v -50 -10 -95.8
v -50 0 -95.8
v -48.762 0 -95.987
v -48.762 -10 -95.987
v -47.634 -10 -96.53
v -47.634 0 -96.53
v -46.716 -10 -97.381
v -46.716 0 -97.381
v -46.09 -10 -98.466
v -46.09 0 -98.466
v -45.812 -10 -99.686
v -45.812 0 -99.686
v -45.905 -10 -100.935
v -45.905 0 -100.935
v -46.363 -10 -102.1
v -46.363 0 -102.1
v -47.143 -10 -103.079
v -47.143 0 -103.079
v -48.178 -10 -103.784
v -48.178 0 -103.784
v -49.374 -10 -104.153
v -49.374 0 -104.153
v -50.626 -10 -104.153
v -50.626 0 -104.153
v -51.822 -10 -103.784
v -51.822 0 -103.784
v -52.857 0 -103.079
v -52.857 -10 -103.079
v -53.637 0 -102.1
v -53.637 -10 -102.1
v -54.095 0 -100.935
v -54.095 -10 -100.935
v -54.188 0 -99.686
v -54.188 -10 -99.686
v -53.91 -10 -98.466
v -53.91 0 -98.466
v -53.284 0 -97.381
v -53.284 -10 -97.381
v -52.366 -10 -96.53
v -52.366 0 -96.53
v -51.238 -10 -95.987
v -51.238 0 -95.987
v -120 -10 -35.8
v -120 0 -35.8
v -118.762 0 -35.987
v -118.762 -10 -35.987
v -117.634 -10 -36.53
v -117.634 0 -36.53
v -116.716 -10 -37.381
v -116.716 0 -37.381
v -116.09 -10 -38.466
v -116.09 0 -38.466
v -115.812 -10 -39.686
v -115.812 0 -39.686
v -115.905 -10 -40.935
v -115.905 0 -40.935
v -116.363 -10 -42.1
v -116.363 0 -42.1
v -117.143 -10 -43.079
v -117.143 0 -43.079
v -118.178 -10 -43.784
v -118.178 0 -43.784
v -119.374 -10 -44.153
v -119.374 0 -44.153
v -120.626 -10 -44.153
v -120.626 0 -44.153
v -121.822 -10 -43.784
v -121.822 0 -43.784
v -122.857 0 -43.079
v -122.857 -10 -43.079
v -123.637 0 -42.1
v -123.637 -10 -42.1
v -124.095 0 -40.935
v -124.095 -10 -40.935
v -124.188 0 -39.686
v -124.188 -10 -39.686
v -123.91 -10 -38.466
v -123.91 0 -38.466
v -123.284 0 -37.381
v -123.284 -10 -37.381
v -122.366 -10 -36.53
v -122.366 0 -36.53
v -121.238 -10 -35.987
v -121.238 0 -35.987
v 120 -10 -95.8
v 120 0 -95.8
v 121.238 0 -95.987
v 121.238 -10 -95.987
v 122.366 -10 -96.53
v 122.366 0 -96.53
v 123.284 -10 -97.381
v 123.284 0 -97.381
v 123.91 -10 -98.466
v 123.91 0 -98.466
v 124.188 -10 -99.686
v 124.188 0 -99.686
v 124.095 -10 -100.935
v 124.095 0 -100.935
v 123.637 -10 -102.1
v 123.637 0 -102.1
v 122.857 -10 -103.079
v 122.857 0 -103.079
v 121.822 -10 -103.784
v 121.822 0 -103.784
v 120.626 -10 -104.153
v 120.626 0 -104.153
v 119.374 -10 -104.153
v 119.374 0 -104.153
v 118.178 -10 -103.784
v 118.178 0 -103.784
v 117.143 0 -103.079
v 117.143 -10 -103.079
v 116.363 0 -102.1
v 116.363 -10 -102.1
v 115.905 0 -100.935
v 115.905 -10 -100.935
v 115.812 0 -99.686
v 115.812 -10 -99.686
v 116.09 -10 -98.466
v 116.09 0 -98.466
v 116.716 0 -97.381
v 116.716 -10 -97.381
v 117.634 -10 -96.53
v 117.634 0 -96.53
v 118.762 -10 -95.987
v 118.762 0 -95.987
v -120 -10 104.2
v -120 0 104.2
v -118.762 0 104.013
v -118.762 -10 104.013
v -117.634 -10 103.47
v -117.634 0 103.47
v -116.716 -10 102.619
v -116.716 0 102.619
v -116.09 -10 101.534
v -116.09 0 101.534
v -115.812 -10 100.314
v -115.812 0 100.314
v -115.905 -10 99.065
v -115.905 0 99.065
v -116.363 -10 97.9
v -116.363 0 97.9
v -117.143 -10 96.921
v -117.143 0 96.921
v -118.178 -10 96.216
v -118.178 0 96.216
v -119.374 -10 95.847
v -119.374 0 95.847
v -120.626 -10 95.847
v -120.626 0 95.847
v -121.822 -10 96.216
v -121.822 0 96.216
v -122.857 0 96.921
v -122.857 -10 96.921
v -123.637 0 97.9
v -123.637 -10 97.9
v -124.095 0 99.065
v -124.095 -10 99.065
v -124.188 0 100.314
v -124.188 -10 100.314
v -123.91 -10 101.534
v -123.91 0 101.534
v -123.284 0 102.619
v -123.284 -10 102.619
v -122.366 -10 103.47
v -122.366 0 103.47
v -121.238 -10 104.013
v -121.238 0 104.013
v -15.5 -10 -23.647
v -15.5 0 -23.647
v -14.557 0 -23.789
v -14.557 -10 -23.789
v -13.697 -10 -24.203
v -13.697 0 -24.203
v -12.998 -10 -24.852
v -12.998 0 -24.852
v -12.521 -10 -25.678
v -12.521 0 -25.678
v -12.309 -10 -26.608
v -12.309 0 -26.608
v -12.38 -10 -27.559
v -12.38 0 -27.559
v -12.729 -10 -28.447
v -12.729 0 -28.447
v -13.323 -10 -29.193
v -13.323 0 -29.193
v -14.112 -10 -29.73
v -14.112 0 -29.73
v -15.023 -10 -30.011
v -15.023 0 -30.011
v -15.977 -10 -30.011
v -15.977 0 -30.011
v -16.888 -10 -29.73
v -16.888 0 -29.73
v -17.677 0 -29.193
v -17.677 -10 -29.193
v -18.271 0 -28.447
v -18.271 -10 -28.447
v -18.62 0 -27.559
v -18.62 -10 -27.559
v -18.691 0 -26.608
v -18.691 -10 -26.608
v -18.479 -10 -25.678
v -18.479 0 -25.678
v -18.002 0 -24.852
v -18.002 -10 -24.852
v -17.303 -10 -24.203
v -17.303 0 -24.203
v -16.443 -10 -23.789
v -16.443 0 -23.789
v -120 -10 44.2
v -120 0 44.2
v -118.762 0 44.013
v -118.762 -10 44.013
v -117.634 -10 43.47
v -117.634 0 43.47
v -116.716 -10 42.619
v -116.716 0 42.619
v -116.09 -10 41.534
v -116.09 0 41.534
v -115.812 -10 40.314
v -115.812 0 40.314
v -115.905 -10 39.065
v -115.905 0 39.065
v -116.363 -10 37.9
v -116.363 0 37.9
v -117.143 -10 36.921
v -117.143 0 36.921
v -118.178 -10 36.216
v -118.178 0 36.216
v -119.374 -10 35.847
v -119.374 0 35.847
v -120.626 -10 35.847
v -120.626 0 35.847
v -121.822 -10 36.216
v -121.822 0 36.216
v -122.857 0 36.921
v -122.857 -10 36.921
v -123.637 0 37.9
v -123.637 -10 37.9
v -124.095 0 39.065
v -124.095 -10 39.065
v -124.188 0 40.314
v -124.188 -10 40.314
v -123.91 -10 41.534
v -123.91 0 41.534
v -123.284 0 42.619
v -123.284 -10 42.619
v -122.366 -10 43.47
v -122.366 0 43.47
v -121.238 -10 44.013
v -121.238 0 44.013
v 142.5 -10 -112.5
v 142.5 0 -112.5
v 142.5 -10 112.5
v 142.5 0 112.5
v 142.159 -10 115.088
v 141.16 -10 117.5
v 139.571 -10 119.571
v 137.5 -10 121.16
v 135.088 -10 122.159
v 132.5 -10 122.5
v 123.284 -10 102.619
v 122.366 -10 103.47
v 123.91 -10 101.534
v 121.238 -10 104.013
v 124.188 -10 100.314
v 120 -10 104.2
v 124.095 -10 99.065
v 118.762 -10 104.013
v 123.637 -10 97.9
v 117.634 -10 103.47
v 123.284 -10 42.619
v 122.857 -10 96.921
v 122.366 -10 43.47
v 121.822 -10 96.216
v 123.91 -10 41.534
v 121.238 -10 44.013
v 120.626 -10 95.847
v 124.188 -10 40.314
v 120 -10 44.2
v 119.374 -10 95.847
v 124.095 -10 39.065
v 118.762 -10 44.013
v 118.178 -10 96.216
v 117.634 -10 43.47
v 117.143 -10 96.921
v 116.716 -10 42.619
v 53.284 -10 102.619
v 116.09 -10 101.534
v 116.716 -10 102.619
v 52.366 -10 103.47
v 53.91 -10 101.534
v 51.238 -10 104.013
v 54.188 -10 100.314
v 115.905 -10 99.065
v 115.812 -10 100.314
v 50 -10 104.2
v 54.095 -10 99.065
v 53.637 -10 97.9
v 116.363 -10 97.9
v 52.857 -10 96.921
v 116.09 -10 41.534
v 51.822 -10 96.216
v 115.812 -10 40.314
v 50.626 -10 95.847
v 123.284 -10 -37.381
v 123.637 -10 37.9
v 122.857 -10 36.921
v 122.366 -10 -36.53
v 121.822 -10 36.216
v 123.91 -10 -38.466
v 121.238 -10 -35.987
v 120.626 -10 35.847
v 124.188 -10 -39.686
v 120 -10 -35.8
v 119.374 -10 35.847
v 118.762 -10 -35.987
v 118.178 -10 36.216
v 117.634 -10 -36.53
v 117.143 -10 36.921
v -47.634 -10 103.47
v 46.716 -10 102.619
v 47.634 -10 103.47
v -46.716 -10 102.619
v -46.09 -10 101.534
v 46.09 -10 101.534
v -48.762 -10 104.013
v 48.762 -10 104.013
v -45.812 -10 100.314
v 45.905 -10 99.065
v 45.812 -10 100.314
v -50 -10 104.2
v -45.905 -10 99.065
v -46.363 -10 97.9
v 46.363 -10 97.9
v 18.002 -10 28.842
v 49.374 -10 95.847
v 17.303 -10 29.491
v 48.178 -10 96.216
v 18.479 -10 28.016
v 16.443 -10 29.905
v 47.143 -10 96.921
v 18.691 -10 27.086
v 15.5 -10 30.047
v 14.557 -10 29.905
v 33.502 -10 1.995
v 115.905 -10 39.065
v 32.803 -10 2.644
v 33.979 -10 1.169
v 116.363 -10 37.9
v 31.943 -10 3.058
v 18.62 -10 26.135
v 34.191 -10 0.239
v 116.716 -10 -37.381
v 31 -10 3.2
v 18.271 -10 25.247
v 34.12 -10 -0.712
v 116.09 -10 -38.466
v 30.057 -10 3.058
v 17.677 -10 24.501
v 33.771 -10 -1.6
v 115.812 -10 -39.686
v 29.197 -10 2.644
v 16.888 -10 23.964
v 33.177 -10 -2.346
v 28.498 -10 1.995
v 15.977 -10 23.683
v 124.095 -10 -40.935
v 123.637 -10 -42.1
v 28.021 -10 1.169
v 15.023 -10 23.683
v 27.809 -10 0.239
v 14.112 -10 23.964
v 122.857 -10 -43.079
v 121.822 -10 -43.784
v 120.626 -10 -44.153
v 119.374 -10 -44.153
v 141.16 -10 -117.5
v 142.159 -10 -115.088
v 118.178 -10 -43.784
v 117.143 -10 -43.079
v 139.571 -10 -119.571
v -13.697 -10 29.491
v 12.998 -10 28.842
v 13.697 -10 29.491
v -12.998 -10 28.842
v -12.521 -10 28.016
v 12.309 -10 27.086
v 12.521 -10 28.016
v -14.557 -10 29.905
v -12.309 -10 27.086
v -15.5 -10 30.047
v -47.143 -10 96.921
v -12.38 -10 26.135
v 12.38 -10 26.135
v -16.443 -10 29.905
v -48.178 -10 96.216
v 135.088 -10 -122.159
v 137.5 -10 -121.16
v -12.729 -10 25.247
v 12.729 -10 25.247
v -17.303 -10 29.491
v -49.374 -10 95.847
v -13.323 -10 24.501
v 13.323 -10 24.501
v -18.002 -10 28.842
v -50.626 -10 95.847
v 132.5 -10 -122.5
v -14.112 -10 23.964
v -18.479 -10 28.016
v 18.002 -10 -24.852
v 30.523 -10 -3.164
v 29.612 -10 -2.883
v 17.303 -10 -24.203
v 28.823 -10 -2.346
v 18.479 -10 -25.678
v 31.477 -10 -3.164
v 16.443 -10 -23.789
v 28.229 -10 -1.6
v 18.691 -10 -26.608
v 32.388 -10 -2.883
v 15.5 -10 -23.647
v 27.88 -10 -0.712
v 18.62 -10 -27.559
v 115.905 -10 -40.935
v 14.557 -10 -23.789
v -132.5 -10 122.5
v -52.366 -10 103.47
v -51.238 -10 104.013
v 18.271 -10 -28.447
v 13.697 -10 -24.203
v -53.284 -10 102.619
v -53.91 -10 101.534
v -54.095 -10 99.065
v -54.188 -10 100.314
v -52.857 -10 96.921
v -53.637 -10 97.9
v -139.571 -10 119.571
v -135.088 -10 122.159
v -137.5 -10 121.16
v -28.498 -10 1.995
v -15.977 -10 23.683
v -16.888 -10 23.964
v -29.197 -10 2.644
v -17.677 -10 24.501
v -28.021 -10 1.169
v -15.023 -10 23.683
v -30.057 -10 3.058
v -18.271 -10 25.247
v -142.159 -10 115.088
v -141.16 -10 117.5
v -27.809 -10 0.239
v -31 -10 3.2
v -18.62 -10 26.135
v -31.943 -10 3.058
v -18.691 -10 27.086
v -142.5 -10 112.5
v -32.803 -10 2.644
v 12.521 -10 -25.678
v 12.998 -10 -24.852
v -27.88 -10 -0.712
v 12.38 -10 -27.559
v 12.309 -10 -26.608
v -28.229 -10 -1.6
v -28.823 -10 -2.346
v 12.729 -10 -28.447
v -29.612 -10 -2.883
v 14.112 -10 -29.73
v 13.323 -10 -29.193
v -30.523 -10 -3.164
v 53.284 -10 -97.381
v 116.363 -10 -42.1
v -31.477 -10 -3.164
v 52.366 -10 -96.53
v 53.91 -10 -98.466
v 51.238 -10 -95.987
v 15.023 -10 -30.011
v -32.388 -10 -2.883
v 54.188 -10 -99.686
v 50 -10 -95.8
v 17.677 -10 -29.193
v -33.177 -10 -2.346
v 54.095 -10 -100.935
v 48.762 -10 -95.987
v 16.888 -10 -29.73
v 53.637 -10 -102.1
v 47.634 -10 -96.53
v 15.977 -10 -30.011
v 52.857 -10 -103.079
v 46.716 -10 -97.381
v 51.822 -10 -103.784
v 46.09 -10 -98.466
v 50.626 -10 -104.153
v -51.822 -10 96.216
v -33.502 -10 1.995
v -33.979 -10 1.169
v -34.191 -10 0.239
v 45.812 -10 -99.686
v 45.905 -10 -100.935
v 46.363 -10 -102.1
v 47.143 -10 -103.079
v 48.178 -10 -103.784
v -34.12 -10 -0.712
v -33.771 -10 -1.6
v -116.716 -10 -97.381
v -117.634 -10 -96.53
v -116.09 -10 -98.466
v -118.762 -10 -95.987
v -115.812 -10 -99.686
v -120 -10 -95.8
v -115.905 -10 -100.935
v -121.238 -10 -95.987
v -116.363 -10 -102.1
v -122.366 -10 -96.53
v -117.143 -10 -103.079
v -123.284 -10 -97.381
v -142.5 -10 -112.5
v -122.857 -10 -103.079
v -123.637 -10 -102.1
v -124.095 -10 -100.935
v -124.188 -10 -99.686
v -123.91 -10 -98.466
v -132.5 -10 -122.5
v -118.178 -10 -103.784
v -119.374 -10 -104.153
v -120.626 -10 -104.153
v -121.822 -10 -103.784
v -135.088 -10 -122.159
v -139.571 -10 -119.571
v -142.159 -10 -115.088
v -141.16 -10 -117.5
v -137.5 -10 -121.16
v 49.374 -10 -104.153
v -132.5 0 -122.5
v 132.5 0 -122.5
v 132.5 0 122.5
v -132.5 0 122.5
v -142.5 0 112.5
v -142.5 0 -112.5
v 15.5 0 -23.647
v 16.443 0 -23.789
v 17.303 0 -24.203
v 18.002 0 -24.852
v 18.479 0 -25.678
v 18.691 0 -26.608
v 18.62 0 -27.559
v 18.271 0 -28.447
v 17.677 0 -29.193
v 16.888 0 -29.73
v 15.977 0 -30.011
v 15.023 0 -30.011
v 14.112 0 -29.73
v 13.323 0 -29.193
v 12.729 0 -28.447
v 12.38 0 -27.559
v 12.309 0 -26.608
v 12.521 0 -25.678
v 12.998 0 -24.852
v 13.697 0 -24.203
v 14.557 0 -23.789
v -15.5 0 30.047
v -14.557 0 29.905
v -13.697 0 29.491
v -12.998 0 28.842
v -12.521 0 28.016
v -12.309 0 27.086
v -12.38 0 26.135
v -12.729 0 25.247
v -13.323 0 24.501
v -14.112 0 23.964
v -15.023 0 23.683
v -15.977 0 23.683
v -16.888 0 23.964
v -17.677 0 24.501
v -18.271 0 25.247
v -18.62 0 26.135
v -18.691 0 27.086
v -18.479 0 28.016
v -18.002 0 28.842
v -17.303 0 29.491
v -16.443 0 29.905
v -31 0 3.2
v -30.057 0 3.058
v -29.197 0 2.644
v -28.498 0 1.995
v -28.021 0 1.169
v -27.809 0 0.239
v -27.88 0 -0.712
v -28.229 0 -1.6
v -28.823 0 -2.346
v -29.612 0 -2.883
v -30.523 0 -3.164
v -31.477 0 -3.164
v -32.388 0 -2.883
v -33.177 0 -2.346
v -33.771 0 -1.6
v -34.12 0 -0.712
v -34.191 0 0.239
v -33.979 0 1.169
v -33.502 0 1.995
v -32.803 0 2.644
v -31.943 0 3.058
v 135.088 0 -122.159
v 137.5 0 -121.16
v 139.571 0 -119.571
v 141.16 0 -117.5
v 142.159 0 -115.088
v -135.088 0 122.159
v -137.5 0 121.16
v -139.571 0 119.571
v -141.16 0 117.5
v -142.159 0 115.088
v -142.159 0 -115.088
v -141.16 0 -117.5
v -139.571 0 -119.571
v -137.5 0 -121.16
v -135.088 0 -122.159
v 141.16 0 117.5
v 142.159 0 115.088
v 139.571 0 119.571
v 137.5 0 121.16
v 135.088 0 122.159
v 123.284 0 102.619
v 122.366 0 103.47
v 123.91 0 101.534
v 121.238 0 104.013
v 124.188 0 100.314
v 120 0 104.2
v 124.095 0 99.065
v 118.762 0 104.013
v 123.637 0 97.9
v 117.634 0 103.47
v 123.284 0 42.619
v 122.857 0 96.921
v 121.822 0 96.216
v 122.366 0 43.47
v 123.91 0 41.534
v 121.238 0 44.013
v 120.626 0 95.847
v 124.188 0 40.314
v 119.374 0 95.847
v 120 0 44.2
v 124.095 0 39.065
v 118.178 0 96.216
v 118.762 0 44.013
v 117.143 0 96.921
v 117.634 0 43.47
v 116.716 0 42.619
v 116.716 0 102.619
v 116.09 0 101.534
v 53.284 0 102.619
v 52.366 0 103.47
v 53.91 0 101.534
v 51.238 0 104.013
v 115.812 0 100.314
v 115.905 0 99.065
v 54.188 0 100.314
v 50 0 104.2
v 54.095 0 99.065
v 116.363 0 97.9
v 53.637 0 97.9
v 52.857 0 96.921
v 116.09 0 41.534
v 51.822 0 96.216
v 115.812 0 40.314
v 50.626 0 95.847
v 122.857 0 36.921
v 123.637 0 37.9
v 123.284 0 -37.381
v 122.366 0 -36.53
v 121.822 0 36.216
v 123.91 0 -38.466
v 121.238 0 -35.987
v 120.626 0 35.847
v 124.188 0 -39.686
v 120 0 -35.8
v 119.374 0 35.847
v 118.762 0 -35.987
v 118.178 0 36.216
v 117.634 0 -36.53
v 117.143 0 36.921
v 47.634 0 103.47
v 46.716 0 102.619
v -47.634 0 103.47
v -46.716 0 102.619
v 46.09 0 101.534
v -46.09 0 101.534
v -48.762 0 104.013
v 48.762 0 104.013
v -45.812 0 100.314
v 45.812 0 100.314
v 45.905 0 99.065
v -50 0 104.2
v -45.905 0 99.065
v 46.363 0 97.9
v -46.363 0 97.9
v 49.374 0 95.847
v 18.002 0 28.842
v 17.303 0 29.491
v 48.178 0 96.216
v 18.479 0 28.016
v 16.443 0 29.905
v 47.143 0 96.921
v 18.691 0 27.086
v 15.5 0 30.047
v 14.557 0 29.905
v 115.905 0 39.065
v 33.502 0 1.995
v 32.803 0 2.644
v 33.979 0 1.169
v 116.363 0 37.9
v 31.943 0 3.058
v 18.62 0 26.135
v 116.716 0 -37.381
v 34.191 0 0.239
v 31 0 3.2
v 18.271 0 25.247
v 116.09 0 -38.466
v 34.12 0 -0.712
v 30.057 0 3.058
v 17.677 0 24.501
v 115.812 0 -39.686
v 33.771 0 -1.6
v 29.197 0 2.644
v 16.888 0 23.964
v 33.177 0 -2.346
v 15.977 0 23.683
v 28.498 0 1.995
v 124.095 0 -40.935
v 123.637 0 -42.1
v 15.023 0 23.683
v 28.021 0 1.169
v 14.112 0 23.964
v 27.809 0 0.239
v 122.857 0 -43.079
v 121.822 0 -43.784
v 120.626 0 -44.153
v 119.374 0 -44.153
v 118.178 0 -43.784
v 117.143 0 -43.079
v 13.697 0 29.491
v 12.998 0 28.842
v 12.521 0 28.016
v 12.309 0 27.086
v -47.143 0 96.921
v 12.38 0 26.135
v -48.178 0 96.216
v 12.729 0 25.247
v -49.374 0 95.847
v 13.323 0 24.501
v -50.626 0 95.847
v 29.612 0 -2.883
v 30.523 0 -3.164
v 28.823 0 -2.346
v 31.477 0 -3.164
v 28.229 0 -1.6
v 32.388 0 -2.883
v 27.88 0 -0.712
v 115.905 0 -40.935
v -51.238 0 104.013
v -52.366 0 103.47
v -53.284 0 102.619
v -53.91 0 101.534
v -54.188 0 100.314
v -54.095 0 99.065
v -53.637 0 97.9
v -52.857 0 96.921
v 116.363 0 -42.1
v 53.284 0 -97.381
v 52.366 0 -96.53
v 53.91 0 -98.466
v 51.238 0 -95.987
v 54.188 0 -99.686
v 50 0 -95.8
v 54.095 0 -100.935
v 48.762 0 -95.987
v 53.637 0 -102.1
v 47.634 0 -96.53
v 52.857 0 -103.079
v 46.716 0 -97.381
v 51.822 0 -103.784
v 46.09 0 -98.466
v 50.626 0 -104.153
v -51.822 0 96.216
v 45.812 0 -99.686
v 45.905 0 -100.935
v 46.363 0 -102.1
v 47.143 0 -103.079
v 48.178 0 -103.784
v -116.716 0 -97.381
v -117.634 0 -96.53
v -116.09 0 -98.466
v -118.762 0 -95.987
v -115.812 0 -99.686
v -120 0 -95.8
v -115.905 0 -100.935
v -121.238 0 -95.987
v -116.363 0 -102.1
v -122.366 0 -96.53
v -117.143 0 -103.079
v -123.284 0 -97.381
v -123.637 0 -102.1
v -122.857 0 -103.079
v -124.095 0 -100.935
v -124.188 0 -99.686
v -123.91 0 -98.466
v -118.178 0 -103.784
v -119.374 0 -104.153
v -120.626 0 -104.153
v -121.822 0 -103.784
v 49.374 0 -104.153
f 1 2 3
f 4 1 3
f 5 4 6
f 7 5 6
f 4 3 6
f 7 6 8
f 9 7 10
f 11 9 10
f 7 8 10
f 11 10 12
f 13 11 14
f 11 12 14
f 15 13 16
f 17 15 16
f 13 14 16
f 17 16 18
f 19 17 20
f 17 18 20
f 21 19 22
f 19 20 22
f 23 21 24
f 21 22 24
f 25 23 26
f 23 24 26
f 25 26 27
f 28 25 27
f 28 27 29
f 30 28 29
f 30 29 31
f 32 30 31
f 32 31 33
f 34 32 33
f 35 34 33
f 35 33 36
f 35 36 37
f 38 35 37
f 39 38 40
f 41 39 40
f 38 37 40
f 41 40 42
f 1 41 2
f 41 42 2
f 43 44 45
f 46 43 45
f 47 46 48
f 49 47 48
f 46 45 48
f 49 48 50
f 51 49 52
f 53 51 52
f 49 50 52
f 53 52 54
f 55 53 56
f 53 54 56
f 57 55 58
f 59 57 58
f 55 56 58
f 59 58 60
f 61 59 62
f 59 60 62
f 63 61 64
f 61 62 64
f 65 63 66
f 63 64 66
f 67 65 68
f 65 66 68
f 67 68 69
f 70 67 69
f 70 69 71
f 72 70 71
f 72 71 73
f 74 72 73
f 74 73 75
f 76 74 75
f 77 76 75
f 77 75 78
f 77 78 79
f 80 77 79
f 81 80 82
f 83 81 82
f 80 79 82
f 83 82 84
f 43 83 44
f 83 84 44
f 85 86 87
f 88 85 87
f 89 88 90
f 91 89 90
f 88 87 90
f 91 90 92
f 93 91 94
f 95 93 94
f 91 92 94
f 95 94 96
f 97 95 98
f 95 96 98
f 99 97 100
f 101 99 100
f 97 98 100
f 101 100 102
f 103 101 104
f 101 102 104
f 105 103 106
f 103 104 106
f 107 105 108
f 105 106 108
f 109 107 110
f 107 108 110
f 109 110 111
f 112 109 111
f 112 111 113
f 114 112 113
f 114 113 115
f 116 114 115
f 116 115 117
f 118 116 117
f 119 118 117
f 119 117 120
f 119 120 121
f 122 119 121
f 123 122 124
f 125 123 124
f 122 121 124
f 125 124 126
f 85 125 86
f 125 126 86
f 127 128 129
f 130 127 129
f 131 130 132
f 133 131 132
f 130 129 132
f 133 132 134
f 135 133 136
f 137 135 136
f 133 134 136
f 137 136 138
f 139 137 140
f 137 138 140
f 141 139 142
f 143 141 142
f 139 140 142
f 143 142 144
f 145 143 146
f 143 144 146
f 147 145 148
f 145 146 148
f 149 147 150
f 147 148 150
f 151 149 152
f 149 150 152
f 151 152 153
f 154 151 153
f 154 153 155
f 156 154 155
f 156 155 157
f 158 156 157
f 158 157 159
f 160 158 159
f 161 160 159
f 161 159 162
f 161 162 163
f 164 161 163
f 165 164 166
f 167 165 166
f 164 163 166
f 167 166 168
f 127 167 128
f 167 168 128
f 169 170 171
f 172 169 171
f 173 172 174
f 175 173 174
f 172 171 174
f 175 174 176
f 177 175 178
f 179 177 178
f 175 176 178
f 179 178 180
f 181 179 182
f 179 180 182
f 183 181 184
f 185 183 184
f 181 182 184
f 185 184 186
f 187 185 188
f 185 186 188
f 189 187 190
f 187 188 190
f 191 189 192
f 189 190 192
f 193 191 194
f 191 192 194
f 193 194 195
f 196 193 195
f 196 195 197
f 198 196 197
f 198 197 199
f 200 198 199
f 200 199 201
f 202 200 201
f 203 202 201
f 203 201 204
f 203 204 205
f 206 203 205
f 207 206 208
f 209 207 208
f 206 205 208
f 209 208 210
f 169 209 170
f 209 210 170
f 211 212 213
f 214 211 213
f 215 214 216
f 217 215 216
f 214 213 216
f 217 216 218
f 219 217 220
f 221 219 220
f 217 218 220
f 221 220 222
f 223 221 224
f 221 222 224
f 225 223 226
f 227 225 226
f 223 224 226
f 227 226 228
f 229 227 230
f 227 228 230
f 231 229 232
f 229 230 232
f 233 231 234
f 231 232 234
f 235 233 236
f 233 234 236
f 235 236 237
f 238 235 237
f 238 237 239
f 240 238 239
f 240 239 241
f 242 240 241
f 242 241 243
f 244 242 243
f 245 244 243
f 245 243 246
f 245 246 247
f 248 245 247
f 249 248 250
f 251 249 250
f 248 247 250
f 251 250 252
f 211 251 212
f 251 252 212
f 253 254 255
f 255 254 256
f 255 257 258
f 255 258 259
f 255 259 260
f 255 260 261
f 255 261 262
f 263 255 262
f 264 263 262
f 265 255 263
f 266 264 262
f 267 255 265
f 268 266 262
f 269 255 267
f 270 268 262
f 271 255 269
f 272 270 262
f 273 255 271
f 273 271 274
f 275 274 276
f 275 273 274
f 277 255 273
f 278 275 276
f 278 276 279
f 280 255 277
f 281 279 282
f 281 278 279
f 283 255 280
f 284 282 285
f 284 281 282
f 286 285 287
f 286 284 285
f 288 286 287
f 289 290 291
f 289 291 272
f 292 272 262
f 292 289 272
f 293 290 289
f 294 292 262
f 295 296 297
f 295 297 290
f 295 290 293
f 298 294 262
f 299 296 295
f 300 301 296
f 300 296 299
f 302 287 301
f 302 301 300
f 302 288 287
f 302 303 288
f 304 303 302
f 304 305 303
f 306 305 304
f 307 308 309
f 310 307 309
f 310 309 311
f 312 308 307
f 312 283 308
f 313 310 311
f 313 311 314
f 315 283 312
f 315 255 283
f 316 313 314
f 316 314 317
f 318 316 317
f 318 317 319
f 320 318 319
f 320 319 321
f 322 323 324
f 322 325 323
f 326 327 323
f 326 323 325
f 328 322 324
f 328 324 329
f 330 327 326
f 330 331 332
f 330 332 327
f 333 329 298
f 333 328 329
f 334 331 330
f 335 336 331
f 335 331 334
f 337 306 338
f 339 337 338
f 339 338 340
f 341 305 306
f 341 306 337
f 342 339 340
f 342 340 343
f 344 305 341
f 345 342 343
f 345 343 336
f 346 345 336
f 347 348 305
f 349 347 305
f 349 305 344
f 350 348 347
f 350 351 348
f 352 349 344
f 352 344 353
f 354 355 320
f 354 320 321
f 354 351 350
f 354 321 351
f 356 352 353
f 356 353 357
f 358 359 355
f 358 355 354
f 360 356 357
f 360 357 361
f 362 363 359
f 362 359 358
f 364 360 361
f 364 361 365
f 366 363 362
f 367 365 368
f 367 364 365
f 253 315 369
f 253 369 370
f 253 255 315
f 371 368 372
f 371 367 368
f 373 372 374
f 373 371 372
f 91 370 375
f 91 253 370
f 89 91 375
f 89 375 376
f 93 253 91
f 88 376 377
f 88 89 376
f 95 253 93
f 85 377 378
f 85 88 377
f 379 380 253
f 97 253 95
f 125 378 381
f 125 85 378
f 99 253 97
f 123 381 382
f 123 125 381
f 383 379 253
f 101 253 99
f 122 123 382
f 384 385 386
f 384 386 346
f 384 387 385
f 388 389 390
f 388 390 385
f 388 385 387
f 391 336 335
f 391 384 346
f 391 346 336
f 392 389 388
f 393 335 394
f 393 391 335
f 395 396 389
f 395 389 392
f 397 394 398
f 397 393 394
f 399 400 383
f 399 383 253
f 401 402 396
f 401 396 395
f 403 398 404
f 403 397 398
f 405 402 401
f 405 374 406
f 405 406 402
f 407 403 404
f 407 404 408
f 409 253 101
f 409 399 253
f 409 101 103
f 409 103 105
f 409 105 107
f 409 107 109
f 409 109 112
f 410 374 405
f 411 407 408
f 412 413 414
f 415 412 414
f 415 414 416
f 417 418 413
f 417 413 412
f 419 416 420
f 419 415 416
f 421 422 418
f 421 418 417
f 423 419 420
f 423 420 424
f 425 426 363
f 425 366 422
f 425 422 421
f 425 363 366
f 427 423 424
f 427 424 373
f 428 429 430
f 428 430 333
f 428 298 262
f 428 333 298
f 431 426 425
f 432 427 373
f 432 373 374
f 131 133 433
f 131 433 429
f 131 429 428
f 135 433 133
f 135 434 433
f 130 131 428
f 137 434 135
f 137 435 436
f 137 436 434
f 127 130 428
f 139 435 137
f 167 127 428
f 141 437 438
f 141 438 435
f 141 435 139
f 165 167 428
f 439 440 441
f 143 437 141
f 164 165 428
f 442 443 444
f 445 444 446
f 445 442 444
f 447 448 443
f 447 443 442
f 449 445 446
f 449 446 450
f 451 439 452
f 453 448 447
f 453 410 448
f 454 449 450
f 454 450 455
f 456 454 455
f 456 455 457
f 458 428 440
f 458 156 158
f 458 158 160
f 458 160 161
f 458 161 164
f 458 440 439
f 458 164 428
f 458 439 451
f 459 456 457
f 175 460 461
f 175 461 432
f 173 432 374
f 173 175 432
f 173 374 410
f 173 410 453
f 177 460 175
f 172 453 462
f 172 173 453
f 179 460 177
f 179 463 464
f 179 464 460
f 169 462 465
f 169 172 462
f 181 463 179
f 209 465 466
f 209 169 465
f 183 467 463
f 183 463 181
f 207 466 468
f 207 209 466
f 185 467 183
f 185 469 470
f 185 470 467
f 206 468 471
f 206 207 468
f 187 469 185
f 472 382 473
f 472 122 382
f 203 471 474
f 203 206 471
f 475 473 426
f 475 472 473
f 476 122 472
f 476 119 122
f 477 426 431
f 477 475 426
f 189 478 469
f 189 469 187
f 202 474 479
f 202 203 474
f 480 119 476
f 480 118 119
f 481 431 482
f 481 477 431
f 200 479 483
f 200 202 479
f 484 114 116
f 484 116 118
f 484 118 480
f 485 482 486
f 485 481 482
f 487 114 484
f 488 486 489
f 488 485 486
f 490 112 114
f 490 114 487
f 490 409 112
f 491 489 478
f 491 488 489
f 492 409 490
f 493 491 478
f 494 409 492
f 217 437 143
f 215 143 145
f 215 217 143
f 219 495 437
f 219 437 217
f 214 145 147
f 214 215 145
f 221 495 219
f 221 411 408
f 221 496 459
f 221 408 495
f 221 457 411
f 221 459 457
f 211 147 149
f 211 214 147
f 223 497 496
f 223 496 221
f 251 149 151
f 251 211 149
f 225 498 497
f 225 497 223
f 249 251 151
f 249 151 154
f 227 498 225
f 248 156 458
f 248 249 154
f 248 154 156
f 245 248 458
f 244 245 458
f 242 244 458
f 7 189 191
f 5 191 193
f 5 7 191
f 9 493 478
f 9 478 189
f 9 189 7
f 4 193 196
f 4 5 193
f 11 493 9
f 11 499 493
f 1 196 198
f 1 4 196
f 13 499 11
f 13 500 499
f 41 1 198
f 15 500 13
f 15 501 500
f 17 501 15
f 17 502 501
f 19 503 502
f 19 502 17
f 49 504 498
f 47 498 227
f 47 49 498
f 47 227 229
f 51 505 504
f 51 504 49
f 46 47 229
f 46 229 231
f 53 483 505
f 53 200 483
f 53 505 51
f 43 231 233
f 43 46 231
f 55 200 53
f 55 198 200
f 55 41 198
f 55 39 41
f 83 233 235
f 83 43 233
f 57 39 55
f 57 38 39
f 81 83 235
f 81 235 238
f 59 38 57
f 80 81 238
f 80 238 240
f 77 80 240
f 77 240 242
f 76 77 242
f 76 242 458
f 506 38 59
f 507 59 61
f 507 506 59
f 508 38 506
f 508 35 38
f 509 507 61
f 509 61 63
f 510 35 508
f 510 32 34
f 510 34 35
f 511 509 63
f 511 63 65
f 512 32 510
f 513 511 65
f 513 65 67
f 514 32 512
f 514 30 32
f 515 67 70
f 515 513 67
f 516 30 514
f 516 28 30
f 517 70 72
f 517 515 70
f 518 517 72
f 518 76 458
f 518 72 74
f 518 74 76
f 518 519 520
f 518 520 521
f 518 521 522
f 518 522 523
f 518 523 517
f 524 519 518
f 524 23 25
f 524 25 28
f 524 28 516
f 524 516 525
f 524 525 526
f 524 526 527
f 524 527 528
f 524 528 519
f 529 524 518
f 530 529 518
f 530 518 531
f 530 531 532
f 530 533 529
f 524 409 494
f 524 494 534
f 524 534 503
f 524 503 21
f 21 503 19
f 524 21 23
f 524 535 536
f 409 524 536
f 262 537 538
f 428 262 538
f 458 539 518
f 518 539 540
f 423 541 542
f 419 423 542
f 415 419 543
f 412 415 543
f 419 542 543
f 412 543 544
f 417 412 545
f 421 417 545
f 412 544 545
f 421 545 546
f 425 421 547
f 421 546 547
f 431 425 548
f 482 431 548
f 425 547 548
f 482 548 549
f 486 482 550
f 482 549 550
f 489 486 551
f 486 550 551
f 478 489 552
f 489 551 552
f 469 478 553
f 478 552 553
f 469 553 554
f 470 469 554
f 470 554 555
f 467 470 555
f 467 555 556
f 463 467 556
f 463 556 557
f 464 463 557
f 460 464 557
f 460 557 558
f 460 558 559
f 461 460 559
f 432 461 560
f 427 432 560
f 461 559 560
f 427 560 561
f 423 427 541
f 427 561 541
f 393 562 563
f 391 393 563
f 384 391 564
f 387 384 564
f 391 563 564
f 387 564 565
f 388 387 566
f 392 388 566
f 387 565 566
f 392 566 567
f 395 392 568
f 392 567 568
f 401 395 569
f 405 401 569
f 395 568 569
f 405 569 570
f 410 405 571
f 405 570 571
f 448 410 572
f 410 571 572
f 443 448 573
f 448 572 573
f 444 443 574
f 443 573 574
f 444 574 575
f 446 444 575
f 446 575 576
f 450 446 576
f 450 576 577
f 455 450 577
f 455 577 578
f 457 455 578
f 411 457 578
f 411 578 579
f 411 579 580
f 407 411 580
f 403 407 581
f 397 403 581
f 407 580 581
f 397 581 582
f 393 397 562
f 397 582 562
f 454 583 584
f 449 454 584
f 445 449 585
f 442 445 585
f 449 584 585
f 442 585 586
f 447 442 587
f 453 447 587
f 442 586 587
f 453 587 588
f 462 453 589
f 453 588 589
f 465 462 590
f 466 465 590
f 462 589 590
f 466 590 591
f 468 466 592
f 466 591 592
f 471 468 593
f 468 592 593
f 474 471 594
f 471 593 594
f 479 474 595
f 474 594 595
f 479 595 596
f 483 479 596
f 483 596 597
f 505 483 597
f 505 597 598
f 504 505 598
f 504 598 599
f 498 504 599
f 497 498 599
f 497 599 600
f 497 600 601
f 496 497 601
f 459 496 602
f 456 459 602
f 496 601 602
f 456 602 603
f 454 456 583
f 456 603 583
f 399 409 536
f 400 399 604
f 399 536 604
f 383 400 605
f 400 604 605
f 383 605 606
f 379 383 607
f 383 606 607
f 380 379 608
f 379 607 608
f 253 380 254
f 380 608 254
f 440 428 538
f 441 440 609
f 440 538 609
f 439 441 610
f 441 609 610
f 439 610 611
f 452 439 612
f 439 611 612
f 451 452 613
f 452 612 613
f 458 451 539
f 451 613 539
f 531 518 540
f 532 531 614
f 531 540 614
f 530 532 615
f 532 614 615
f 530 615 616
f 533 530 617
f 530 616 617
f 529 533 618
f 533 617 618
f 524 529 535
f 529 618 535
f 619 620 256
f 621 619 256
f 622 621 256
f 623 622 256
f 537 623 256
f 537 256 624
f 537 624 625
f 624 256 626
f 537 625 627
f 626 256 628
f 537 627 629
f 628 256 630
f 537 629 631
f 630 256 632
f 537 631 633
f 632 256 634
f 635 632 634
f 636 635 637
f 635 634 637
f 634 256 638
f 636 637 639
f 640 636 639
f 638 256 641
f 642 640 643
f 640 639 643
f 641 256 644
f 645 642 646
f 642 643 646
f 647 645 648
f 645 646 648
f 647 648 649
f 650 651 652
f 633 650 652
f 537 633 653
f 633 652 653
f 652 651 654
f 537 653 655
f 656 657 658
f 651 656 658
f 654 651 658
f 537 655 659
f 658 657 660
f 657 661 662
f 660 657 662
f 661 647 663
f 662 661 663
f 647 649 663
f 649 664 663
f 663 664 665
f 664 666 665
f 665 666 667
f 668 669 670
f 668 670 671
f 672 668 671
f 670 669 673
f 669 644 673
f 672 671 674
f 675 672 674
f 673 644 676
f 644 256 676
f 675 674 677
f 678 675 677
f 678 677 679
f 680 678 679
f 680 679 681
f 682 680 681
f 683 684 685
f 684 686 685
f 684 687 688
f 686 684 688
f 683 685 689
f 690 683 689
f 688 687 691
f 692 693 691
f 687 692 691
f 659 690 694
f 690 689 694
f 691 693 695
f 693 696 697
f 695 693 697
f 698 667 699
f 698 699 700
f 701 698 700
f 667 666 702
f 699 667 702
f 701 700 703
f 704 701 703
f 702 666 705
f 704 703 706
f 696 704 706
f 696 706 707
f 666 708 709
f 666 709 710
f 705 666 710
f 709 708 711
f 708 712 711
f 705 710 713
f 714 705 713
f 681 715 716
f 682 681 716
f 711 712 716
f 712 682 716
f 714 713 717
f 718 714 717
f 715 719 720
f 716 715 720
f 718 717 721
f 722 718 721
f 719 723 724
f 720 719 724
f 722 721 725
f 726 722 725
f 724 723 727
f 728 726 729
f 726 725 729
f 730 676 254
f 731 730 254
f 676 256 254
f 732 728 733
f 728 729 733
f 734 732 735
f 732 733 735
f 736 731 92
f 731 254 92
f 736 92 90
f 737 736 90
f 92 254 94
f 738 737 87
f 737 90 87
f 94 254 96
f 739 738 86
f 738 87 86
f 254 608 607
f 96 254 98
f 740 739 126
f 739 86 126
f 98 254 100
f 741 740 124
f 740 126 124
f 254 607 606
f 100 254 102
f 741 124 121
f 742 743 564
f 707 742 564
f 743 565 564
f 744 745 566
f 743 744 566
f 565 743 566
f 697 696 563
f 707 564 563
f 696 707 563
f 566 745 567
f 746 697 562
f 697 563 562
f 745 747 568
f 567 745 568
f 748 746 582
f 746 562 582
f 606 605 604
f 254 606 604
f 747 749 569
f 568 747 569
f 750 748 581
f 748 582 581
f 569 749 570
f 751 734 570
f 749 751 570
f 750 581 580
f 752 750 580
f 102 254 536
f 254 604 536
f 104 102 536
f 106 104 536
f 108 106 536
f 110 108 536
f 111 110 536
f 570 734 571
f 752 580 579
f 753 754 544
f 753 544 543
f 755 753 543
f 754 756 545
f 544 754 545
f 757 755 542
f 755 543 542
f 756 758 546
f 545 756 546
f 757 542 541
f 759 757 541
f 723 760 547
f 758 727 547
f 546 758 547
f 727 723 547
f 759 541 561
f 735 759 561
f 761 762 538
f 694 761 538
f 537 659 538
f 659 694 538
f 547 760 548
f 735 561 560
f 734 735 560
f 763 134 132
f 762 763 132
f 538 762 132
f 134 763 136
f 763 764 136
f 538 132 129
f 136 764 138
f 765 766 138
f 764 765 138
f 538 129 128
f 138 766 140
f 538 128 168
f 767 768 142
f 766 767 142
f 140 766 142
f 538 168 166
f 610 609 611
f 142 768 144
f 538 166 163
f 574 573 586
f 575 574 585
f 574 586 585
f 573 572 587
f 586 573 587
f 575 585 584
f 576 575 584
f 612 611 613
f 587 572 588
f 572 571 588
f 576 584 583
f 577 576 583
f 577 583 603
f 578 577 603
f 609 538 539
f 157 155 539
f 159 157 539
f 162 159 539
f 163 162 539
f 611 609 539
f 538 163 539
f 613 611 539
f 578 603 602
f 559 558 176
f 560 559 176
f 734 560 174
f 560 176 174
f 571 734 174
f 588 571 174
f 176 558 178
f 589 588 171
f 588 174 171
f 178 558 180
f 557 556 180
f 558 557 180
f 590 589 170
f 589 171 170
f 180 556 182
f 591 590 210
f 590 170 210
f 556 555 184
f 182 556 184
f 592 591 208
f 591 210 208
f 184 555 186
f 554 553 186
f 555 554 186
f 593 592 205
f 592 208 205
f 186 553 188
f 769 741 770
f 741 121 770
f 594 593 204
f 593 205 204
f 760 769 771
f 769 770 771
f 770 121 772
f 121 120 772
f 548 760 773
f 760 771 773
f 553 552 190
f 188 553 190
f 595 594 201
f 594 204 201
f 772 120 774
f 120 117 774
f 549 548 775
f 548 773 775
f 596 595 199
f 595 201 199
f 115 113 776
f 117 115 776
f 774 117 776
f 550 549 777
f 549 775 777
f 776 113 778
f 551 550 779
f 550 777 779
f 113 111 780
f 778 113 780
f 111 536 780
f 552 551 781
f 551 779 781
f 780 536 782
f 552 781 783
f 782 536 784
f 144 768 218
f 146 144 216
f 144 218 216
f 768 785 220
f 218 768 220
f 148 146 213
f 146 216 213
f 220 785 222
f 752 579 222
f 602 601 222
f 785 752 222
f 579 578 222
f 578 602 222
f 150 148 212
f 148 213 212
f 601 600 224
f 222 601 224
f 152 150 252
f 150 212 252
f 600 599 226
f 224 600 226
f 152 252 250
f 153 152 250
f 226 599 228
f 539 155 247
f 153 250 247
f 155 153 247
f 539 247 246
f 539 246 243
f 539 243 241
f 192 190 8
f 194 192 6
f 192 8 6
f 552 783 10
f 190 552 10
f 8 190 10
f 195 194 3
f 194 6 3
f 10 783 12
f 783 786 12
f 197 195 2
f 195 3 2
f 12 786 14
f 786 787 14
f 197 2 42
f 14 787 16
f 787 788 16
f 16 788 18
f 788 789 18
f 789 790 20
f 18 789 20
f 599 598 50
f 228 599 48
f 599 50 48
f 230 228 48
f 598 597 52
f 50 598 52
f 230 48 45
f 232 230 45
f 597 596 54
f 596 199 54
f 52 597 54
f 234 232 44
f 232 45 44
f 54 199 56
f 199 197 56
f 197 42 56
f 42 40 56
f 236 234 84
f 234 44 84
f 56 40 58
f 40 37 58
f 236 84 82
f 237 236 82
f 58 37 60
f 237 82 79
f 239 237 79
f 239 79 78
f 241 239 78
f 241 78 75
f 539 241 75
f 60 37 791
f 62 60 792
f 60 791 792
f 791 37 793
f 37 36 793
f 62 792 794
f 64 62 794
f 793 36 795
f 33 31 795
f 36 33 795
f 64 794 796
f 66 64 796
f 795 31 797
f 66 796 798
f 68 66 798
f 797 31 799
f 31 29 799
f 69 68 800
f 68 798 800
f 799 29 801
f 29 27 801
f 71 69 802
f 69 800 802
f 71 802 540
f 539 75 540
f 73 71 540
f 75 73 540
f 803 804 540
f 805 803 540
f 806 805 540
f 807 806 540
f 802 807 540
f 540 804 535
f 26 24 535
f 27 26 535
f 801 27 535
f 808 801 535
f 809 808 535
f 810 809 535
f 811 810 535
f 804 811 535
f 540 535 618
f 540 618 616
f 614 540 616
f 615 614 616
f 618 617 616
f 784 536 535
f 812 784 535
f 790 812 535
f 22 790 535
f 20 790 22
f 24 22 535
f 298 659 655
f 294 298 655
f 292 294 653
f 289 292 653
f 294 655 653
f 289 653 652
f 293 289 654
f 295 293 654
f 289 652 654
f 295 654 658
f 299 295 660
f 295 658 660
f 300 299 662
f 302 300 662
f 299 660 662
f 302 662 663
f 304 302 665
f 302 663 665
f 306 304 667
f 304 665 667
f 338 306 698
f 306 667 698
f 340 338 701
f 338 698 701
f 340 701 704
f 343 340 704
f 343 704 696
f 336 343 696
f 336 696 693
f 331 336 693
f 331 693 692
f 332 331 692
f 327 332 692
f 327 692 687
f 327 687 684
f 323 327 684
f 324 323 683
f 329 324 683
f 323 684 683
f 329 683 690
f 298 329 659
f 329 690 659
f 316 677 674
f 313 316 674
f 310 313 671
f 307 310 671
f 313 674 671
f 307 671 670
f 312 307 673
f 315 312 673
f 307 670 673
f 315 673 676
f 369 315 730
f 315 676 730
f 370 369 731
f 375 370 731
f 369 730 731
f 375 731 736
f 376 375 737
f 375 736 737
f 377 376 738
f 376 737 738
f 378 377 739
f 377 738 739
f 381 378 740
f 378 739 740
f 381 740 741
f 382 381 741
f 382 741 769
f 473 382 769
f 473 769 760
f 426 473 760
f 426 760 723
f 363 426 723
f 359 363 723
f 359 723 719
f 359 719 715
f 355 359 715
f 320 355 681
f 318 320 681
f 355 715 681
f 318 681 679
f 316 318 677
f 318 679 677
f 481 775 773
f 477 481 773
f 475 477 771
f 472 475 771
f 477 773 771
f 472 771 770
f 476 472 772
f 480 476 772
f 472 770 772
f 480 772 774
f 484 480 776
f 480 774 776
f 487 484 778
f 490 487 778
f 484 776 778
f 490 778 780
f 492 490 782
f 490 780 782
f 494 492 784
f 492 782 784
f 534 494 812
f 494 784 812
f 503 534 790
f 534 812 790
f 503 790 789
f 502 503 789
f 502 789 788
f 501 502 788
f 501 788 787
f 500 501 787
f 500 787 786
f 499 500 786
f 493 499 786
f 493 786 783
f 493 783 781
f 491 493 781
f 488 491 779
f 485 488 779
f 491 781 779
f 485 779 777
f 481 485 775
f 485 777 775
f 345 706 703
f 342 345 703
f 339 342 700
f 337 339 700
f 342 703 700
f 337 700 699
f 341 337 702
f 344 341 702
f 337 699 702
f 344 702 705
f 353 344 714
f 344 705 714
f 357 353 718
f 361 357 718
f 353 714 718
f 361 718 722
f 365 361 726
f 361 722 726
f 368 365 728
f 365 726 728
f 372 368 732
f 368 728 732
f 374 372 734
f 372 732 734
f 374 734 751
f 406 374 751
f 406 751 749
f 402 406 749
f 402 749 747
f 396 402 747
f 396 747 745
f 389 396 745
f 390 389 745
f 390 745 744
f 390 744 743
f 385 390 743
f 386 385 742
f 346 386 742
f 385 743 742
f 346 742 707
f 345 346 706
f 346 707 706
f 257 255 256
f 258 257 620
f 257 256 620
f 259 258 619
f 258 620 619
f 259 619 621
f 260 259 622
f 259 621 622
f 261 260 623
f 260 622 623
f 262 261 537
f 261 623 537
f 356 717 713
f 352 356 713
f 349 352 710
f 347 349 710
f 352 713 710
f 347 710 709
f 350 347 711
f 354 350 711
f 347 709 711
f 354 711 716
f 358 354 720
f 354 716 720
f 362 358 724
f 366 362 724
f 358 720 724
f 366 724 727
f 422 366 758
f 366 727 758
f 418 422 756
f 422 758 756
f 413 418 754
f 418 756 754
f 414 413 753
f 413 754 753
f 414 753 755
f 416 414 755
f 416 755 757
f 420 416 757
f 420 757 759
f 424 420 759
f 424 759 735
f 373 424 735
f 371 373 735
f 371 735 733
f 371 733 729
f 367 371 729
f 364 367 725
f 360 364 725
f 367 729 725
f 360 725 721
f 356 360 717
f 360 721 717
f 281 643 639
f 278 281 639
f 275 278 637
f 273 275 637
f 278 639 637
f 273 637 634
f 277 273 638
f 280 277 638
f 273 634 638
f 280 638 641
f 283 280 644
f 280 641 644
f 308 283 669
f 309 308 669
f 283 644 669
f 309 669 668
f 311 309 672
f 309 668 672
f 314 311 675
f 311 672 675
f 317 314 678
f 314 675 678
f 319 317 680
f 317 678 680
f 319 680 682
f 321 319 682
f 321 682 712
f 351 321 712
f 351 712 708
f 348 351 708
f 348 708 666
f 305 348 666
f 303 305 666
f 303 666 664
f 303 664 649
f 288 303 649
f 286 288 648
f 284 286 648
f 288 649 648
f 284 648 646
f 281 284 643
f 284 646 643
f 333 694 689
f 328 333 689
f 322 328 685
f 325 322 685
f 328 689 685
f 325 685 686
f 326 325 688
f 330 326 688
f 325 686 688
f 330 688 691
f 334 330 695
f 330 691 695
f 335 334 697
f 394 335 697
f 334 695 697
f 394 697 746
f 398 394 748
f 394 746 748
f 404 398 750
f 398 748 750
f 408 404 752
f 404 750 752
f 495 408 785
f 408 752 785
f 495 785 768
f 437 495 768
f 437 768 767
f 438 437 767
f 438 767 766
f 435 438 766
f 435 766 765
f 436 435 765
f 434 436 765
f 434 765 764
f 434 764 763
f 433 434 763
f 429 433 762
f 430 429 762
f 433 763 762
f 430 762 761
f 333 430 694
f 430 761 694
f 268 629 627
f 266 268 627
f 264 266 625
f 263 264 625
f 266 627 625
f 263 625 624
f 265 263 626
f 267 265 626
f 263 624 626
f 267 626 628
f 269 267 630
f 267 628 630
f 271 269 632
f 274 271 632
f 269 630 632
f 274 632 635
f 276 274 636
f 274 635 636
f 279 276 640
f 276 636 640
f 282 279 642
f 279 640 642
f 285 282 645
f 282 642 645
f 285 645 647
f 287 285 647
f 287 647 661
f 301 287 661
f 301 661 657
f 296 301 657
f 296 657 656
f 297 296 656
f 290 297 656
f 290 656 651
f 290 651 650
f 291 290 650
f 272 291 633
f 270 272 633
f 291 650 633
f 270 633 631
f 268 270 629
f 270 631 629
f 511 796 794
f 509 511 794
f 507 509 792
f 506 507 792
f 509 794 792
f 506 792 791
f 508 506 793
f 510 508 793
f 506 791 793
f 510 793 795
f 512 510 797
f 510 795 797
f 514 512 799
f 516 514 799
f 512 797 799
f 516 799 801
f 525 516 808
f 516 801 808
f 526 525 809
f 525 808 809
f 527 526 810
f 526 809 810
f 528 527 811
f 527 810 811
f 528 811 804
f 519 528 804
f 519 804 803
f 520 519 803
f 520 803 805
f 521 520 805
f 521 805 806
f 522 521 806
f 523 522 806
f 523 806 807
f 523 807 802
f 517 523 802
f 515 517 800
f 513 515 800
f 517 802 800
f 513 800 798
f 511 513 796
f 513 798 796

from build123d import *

# Parameters (mm, degrees)
SKETCH1_R          = 4.2
SKETCH1_R_2        = 3.2
BASE_FLANGE1_DEPTH = 10


# Sheet-metal steps are written as plain solids
with BuildPart() as part:
    # Sketch1 → Base-Flange1 (new body)
    with BuildSketch(Plane(origin=(0, 0, 0), x_dir=(1, 0, 0), z_dir=(0, 1, 0))):
        with BuildLine():
            Line((-132.5, 122.5), (132.5, 122.5))
            ThreePointArc((132.5, 122.5), (139.571067812, 119.571067812), (142.5, 112.5))
            Line((142.5, 112.5), (142.5, -112.5))
            ThreePointArc((142.5, -112.5), (139.571067812, -119.571067812), (132.5, -122.5))
            Line((132.5, -122.5), (-132.5, -122.5))
            ThreePointArc((-132.5, -122.5), (-139.571067812, -119.571067812), (-142.5, -112.5))
            Line((-142.5, -112.5), (-142.5, 112.5))
            ThreePointArc((-142.5, 112.5), (-139.571067812, 119.571067812), (-132.5, 122.5))
        make_face()
        with Locations(Location((120, 40, 0), (0, 0, 270))):
            Circle(SKETCH1_R, mode=Mode.SUBTRACT)
        with Locations(Location((120, -40, 0), (0, 0, 270))):
            Circle(SKETCH1_R, mode=Mode.SUBTRACT)
        with Locations(Location((-120, 40, 0), (0, 0, 270))):
            Circle(SKETCH1_R, mode=Mode.SUBTRACT)
        with Locations(Location((-120, -40, 0), (0, 0, 270))):
            Circle(SKETCH1_R, mode=Mode.SUBTRACT)
        with Locations(Location((-120, 100, 0), (0, 0, 270))):
            Circle(SKETCH1_R, mode=Mode.SUBTRACT)
        with Locations(Location((-50, 100, 0), (0, 0, 270))):
            Circle(SKETCH1_R, mode=Mode.SUBTRACT)
        with Locations(Location((50, 100, 0), (0, 0, 270))):
            Circle(SKETCH1_R, mode=Mode.SUBTRACT)
        with Locations(Location((120, 100, 0), (0, 0, 270))):
            Circle(SKETCH1_R, mode=Mode.SUBTRACT)
        with Locations(Location((120, -100, 0), (0, 0, 270))):
            Circle(SKETCH1_R, mode=Mode.SUBTRACT)
        with Locations(Location((50, -100, 0), (0, 0, 270))):
            Circle(SKETCH1_R, mode=Mode.SUBTRACT)
        with Locations(Location((-50, -100, 0), (0, 0, 270))):
            Circle(SKETCH1_R, mode=Mode.SUBTRACT)
        with Locations(Location((-120, -100, 0), (0, 0, 270))):
            Circle(SKETCH1_R, mode=Mode.SUBTRACT)
        with Locations(Location((31, 0, 0), (0, 0, 270))):
            Circle(SKETCH1_R_2, mode=Mode.SUBTRACT)
        with Locations(Location((15.5, -26.846787517, 0), (0, 0, 270))):
            Circle(SKETCH1_R_2, mode=Mode.SUBTRACT)
        with Locations(Location((-15.5, -26.846787517, 0), (0, 0, 270))):
            Circle(SKETCH1_R_2, mode=Mode.SUBTRACT)
        with Locations(Location((-31, 0, 0), (0, 0, 270))):
            Circle(SKETCH1_R_2, mode=Mode.SUBTRACT)
        with Locations(Location((-15.5, 26.846787517, 0), (0, 0, 270))):
            Circle(SKETCH1_R_2, mode=Mode.SUBTRACT)
        with Locations(Location((15.5, 26.846787517, 0), (0, 0, 270))):
            Circle(SKETCH1_R_2, mode=Mode.SUBTRACT)
    extrude(amount=-BASE_FLANGE1_DEPTH)


solid = part.part
